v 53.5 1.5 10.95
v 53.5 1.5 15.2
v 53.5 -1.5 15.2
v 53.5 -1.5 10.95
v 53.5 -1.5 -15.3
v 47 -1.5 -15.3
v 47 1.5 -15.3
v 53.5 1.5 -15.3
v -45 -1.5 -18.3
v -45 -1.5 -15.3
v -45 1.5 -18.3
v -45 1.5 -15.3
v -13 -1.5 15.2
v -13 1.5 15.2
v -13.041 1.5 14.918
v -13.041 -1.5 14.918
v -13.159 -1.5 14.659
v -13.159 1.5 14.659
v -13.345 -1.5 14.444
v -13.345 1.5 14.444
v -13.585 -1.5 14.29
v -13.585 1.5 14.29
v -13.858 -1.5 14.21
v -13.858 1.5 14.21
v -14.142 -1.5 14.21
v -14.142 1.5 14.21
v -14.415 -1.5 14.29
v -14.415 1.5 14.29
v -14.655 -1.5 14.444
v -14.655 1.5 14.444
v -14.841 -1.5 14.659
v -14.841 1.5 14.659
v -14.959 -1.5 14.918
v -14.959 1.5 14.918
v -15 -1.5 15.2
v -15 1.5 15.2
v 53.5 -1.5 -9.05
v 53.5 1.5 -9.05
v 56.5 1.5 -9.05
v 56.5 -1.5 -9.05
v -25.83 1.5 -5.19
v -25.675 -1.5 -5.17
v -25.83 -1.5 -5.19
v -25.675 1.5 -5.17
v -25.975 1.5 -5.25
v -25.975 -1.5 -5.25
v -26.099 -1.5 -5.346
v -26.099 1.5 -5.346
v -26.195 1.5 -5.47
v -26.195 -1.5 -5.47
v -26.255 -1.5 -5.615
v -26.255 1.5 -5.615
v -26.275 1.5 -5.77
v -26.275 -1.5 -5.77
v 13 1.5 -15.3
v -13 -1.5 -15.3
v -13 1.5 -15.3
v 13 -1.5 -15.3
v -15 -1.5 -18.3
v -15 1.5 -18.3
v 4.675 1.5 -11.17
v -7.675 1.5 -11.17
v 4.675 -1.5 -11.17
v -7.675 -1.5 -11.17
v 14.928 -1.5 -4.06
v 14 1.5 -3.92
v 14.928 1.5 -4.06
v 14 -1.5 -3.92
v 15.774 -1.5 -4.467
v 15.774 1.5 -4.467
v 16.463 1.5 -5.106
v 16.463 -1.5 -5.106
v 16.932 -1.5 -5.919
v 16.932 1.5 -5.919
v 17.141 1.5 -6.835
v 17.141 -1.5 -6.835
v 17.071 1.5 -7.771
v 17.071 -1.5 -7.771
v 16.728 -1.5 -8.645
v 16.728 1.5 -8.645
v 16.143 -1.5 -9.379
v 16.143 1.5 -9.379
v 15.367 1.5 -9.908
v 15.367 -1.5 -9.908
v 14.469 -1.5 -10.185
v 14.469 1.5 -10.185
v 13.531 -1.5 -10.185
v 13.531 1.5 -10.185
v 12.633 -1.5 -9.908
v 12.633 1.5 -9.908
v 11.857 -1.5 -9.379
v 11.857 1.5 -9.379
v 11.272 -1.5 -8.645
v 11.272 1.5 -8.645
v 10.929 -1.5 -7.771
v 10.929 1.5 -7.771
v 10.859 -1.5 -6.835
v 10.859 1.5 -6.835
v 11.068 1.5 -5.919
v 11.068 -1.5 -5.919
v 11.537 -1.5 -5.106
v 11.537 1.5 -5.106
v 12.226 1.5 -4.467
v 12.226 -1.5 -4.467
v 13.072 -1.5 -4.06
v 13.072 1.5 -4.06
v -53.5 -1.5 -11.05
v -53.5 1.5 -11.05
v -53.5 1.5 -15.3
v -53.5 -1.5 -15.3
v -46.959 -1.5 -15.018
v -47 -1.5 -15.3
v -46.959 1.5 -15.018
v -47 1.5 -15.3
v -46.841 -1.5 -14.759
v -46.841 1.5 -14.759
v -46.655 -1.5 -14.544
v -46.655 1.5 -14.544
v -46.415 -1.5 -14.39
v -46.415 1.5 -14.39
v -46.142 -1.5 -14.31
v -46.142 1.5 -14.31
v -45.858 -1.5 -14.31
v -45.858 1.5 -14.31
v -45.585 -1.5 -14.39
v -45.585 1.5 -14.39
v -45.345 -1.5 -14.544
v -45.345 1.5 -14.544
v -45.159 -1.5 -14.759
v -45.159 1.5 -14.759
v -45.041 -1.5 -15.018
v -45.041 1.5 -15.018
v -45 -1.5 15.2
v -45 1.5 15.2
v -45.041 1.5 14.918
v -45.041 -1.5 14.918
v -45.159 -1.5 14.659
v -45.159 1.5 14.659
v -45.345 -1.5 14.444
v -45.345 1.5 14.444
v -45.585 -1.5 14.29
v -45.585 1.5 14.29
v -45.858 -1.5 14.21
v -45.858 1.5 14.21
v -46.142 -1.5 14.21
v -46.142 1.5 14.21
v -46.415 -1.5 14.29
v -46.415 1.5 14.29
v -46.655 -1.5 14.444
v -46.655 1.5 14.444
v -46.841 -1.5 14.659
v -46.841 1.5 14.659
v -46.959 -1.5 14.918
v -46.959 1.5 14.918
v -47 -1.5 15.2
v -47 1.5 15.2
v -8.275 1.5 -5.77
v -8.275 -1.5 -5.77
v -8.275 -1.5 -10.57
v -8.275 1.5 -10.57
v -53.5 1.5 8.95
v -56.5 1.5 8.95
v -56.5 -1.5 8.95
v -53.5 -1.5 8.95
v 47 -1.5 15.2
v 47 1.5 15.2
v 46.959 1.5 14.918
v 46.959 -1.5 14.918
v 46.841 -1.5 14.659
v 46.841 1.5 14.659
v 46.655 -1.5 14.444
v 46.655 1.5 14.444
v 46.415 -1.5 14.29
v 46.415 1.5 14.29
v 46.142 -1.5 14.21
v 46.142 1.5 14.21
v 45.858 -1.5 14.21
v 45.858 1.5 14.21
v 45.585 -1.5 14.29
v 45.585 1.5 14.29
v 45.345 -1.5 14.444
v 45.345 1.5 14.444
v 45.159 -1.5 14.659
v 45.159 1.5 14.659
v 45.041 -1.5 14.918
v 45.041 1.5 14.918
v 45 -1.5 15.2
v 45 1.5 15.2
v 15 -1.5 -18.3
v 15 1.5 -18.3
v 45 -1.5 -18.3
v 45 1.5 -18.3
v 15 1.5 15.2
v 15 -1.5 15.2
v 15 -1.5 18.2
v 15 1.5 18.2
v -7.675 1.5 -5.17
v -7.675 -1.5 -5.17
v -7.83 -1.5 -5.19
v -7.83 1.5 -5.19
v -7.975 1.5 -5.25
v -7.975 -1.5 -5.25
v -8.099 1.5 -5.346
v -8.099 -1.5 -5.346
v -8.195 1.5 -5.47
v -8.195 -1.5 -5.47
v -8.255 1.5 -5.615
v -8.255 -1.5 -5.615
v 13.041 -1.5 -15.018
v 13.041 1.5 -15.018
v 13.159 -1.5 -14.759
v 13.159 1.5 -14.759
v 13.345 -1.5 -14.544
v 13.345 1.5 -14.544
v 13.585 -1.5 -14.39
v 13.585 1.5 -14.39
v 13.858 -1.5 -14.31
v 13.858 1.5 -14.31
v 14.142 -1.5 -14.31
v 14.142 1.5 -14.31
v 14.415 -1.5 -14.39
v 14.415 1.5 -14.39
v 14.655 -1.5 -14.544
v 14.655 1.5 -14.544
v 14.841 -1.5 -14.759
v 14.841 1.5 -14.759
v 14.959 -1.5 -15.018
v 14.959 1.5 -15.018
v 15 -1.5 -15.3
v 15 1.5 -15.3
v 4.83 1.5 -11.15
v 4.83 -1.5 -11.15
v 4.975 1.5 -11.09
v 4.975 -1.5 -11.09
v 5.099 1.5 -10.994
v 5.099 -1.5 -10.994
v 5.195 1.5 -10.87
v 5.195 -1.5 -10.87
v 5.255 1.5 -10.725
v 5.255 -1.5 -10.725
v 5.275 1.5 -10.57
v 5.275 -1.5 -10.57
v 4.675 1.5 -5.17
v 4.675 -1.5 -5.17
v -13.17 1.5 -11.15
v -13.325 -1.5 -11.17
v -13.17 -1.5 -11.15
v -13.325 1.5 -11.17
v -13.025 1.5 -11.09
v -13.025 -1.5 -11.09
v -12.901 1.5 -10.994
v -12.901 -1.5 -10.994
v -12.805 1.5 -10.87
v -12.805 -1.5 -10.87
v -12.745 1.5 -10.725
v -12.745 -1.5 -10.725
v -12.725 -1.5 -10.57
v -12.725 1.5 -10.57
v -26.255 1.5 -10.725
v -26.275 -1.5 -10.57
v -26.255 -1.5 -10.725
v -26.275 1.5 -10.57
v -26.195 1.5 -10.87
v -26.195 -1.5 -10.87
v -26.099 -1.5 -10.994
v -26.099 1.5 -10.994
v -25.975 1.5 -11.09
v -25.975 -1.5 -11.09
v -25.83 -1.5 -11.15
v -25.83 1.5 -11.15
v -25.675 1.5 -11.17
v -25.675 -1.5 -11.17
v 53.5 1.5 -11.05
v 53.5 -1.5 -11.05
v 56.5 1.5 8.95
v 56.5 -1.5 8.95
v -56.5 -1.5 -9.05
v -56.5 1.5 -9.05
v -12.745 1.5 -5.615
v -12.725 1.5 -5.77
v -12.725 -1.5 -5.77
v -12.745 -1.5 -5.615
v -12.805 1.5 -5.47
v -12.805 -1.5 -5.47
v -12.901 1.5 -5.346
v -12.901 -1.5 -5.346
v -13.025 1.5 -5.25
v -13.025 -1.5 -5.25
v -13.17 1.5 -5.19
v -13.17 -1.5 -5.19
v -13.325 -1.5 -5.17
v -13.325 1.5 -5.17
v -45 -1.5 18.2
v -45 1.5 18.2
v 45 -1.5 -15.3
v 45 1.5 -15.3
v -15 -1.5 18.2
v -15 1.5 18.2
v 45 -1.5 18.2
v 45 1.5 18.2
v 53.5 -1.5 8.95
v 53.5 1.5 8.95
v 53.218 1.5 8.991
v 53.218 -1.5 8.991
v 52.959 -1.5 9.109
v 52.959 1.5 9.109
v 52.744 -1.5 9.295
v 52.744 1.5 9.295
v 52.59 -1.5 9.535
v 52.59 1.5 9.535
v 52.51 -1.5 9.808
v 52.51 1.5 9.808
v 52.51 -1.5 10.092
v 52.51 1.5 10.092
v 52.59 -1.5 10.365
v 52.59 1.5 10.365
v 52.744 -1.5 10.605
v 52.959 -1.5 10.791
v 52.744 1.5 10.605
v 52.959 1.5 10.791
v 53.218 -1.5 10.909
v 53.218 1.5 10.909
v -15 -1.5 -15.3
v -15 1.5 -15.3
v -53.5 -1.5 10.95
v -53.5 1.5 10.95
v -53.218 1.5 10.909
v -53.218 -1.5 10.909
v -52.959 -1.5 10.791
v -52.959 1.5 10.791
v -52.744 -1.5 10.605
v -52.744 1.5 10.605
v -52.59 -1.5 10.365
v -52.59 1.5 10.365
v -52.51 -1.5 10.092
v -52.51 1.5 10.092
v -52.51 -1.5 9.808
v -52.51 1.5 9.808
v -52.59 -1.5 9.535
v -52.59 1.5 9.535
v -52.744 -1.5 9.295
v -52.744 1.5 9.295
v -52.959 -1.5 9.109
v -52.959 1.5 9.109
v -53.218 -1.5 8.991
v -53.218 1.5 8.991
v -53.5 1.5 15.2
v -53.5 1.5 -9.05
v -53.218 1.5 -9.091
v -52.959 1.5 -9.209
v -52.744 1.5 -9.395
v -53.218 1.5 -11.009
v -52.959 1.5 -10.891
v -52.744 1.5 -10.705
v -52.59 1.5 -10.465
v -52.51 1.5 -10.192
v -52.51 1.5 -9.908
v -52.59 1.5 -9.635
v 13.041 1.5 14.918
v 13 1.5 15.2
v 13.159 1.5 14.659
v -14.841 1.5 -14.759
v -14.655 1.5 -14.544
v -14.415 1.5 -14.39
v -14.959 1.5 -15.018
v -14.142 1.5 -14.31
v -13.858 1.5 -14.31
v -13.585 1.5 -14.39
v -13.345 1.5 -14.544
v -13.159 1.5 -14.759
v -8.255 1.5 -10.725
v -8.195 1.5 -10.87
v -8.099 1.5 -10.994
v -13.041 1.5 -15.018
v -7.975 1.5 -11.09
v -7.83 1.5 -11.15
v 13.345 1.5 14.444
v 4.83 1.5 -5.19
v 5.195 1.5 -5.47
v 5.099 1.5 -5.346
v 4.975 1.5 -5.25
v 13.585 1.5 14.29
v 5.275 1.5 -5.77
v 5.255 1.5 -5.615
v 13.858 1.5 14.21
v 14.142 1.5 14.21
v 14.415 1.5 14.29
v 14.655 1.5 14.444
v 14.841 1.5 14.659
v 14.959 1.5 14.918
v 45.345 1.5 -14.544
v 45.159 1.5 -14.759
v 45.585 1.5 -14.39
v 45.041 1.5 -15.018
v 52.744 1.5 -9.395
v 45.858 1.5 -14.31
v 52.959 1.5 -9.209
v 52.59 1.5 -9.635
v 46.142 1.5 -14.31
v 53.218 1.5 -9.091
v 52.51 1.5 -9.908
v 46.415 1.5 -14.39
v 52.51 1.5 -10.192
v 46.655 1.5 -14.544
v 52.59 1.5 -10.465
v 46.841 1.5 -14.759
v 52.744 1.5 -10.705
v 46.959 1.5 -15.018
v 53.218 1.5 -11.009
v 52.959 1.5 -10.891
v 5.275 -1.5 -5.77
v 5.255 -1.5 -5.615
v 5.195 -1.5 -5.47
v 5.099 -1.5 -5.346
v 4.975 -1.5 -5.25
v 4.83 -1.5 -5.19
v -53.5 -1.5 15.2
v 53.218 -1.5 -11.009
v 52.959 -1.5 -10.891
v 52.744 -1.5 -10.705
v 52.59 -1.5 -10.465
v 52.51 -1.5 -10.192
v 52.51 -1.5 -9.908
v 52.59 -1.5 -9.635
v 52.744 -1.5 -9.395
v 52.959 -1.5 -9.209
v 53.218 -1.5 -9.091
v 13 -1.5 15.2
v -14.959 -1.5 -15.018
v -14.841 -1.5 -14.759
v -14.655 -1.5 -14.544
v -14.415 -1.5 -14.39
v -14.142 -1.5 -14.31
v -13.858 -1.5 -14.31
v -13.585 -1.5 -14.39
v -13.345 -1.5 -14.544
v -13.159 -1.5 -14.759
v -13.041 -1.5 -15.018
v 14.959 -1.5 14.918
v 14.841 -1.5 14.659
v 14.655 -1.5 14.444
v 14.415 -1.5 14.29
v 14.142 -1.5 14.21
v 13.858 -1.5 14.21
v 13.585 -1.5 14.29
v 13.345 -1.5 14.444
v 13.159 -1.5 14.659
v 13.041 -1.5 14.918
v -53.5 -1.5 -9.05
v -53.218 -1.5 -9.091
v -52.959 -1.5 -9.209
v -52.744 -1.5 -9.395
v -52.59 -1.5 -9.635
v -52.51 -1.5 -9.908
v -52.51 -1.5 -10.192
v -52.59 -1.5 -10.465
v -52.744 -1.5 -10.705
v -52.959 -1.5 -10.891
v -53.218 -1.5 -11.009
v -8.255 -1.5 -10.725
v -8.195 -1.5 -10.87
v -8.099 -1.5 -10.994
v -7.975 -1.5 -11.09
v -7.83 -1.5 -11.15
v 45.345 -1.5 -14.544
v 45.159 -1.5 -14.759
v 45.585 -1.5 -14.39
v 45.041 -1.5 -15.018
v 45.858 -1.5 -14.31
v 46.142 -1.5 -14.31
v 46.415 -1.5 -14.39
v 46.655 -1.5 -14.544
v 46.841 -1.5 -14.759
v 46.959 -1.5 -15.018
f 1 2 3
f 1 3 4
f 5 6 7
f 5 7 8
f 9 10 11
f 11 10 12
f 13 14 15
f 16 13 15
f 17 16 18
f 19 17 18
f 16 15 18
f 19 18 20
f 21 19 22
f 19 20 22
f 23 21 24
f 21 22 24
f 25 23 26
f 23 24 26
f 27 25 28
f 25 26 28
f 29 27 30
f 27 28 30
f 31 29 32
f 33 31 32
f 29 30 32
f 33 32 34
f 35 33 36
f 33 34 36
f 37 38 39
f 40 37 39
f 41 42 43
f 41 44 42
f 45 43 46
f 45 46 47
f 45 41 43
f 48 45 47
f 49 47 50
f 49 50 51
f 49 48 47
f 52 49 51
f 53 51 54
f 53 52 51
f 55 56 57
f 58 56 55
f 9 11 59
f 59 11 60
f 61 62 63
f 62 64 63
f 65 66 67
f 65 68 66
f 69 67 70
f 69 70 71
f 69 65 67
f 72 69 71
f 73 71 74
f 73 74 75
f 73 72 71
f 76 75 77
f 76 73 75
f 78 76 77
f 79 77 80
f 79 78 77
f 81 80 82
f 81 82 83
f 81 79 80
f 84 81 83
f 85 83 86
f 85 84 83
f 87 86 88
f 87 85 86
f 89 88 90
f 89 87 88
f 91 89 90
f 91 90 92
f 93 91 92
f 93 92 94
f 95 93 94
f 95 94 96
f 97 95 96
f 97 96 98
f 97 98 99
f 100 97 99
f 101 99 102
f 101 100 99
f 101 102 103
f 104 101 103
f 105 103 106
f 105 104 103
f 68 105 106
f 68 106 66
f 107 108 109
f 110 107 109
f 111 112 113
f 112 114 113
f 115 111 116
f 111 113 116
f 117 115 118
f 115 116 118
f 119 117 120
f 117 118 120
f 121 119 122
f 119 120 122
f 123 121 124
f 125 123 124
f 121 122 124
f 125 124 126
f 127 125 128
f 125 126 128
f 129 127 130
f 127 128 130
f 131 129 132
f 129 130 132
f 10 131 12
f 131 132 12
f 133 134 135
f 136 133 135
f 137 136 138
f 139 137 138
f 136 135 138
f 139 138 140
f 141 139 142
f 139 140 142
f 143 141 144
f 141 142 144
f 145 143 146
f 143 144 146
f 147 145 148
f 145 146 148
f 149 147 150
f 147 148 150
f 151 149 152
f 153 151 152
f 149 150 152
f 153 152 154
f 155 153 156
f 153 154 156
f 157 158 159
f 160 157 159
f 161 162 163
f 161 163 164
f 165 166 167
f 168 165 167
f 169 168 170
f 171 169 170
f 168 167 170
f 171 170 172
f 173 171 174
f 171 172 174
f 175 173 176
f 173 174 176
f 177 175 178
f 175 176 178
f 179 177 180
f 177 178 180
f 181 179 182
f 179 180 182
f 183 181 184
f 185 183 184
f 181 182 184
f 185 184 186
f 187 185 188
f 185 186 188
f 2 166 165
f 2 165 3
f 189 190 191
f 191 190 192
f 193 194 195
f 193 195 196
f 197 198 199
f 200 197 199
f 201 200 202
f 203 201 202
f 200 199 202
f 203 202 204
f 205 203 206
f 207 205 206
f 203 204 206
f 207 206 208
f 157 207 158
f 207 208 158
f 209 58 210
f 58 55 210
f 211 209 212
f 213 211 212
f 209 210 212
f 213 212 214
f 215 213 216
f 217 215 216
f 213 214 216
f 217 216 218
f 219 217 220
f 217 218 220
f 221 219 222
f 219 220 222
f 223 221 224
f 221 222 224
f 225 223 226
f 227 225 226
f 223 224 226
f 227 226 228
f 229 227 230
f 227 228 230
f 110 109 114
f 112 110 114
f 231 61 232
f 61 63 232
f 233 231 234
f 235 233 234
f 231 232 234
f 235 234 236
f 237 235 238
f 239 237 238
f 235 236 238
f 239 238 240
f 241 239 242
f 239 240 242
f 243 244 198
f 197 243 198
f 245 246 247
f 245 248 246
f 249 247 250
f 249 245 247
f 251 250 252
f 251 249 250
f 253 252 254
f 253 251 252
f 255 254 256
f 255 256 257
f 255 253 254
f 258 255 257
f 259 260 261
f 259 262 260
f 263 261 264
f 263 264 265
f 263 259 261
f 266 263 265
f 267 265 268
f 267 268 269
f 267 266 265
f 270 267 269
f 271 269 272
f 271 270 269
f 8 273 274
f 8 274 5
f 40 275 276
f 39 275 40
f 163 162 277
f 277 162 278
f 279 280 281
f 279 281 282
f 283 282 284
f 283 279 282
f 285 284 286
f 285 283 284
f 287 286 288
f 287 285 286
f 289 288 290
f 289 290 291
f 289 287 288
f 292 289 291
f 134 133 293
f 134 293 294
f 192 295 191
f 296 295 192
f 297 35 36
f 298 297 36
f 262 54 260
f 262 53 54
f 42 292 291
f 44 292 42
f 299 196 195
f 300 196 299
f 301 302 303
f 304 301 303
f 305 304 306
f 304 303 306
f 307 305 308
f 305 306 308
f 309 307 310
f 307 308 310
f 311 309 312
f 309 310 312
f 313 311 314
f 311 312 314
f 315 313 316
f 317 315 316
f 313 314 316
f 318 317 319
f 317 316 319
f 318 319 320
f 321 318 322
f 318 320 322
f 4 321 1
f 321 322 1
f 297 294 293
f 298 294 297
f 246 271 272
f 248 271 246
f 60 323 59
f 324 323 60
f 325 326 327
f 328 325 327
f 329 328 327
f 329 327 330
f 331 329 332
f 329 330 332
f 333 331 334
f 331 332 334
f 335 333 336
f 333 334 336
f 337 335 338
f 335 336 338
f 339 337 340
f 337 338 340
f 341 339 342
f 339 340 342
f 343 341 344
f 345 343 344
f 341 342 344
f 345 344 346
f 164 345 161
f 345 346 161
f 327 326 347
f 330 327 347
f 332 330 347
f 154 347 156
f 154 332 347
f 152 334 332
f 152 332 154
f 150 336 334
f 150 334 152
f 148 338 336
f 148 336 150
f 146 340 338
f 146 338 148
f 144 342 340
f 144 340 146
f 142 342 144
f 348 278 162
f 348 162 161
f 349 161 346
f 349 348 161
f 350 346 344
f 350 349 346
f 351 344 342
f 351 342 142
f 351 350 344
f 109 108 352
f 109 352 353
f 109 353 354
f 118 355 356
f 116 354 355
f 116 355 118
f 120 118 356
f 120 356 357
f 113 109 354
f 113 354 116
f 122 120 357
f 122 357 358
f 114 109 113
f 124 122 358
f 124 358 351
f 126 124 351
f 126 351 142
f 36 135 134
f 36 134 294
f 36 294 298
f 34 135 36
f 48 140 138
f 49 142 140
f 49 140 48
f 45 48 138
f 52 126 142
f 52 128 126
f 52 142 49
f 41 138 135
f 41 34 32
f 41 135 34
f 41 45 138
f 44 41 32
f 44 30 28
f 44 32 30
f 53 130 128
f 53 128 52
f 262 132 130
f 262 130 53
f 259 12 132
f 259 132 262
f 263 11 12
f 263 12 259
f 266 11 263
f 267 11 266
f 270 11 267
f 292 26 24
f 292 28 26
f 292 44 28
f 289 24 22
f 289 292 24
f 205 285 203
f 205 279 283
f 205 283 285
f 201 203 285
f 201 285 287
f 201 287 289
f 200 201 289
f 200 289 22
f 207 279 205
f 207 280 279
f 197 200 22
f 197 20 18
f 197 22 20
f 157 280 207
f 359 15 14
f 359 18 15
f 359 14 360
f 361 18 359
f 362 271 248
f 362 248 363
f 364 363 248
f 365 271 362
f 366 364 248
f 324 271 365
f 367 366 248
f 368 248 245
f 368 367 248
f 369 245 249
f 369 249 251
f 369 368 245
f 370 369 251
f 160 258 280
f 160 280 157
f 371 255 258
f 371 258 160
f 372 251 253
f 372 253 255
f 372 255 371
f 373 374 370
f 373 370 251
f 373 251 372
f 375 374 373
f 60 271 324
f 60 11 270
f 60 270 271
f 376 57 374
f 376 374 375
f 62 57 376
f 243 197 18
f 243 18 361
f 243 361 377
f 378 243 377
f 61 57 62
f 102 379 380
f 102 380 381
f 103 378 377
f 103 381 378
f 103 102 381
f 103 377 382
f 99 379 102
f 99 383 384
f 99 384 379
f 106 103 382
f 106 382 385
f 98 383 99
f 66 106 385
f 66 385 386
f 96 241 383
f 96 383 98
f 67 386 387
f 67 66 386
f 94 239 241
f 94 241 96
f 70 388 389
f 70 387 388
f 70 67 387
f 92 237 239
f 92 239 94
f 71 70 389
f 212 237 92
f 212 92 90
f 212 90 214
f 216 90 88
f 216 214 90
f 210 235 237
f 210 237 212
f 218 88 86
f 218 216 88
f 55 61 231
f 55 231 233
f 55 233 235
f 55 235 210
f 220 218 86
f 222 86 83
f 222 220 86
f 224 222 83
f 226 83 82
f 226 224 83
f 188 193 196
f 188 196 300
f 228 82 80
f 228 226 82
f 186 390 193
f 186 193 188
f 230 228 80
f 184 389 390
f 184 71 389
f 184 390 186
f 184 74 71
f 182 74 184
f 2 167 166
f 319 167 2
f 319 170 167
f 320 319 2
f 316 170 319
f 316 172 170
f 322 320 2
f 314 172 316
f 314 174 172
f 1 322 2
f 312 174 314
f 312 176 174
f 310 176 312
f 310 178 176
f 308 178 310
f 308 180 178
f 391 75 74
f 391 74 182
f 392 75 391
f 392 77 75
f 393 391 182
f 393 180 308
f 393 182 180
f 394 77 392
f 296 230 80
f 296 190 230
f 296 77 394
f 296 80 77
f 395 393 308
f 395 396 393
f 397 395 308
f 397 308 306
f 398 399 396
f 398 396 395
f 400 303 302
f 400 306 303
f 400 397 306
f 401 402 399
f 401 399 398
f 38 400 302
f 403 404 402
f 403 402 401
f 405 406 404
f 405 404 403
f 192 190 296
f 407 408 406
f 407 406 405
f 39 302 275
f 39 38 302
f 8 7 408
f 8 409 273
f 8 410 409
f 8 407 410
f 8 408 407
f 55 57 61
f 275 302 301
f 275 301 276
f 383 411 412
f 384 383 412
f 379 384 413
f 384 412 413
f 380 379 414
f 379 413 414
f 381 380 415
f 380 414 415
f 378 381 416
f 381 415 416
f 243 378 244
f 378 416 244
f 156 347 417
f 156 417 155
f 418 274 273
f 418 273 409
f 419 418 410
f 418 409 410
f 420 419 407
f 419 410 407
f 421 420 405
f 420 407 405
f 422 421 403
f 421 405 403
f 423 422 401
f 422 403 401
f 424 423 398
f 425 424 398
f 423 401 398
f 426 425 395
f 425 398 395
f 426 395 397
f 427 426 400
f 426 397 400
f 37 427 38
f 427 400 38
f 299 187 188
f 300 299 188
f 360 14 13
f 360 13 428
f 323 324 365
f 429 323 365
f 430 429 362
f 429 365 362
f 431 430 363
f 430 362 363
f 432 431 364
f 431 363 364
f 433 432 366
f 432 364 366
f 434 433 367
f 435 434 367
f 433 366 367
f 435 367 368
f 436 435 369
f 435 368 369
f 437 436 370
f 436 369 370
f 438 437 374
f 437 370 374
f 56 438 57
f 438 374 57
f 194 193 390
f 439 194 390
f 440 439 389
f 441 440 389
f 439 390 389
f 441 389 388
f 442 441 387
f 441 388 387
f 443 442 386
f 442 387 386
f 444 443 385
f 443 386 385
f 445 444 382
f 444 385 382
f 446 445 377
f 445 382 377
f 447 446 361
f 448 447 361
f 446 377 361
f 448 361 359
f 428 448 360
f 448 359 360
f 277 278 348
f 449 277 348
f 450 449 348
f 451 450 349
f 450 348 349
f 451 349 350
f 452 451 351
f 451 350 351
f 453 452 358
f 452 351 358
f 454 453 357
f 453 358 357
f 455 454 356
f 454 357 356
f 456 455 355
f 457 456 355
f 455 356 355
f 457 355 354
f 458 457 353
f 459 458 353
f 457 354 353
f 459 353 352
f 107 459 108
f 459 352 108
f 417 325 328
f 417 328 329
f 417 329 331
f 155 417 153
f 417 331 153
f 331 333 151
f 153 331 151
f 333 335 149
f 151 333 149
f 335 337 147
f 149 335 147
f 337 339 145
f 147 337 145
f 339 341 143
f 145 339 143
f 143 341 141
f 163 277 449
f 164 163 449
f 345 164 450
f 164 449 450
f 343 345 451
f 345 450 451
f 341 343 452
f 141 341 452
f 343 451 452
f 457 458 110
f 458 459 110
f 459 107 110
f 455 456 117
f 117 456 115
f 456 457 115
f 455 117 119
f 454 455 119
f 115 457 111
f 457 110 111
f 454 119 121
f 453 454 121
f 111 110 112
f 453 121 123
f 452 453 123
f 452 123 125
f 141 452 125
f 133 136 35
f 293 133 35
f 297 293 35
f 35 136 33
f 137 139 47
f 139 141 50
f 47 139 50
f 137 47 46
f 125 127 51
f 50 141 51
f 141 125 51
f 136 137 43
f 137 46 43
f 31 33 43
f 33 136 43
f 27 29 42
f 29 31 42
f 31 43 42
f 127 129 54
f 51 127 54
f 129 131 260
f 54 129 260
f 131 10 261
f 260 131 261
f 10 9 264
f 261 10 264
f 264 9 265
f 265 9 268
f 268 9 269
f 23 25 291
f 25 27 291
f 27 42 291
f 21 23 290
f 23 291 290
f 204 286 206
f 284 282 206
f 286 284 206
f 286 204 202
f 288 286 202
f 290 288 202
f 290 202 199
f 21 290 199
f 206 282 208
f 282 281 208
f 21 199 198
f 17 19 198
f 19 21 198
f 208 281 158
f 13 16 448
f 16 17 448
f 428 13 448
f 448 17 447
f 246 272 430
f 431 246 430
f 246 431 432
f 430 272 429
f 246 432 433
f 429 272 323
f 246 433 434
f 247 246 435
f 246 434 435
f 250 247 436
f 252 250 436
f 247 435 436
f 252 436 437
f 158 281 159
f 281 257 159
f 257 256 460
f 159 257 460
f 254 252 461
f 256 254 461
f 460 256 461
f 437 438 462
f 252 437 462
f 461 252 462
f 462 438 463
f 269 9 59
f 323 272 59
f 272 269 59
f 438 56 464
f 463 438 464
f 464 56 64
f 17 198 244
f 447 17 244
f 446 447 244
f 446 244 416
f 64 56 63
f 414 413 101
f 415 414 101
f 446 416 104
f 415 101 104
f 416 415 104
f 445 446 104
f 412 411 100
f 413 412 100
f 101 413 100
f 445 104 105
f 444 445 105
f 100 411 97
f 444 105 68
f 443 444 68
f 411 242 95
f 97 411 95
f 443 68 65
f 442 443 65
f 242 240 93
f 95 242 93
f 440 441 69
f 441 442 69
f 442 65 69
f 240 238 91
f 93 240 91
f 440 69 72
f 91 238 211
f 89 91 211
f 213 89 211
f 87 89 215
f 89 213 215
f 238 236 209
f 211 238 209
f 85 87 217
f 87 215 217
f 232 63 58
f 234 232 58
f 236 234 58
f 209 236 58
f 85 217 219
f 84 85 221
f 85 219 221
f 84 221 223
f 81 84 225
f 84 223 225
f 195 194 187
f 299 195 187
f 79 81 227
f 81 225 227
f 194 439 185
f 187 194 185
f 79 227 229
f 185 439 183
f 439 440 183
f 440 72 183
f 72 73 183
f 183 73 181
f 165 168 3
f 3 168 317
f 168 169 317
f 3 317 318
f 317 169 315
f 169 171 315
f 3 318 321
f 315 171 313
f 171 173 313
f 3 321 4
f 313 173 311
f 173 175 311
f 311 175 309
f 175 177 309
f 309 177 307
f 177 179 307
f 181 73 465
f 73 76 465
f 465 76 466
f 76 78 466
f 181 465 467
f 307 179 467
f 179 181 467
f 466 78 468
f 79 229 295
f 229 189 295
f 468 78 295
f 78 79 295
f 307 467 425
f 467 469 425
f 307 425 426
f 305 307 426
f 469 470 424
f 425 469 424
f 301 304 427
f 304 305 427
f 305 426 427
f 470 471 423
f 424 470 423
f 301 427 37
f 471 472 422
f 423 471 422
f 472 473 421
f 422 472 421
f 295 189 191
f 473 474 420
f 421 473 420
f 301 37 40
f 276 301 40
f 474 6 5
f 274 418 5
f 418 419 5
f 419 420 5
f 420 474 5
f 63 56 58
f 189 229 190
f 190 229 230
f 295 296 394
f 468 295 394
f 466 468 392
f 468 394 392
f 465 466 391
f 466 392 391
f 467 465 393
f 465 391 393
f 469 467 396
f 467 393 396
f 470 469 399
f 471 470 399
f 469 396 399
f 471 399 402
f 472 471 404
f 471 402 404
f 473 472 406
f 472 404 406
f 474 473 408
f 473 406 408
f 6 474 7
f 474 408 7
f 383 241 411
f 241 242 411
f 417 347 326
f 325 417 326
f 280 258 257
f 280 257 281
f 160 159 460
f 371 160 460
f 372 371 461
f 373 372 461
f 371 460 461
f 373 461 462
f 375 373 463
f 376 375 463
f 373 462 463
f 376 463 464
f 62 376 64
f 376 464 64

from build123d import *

# Parameters (mm, degrees)
EXTRUDE_1_DEPTH     = 1.5
SKETCH_3_R          = 3.15
CUT_EXTRUDE_2_DEPTH = 1.5
SKETCH_5_W          = 99
SKETCH_5_H          = 11.3
CUT_EXTRUDE_4_DEPTH = 10
SKETCH_6_W          = 30
SKETCH_6_H          = 3
EXTRUDE_2_DEPTH     = 3
SKETCH_8_W          = 3
SKETCH_8_H          = 18
SKETCH_8_W_2        = 4
SKETCH_8_H_2        = 30.5
EXTRUDE_3_DEPTH     = 3
SKETCH_7_R          = 1
CUT_EXTRUDE_5_DEPTH = 3


with BuildPart() as part:
    # 草图2 → 凸台-拉伸1 (new, symmetric)
    with BuildSketch(Plane(origin=(0, 0, 0), x_dir=(1, 0, 0), z_dir=(0, 1, 0))):
        Polygon((-49.5, 26.6), (-49.5, -15.2), (49.5, -15.2), (49.5, 26.599983447), align=None)
    extrude(amount=EXTRUDE_1_DEPTH, both=True)

    # 草图3 → 切除-拉伸2 (cut, symmetric)
    with BuildSketch(Plane(origin=(0, 0, 0), x_dir=(1, 0, 0), z_dir=(0, 1, 0))):
        with Locations(Location((13.999999636, 7.069989383, 0), (0, 0, 270))):
            Circle(SKETCH_3_R)
        with BuildLine():
            Line((5.275, 10.57), (5.275, 5.77))
            ThreePointArc((5.275, 5.77), (5.099264069, 5.345735931), (4.675, 5.17))
            Line((4.675, 5.17), (-7.675, 5.17))
            ThreePointArc((-7.675, 5.17), (-8.099264069, 5.345735931), (-8.275, 5.77))
            Line((-8.275, 5.77), (-8.275, 10.57))
            ThreePointArc((-8.275, 10.57), (-8.099264069, 10.994264069), (-7.675, 11.17))
            Line((-7.675, 11.17), (4.675, 11.17))
            ThreePointArc((4.675, 11.17), (5.099264069, 10.994264069), (5.275, 10.57))
        make_face()
        with BuildLine():
            Line((-13.325, 5.17), (-25.675, 5.17))
            ThreePointArc((-25.675, 5.17), (-26.099264069, 5.345735931), (-26.275, 5.77))
            Line((-26.275, 5.77), (-26.275, 10.57))
            ThreePointArc((-26.275, 10.57), (-26.099264069, 10.994264069), (-25.675, 11.17))
            Line((-25.675, 11.17), (-13.325, 11.17))
            ThreePointArc((-13.325, 11.17), (-12.900735931, 10.994264069), (-12.725, 10.57))
            Line((-12.725, 10.57), (-12.725, 5.77))
            ThreePointArc((-12.725, 5.77), (-12.900735931, 5.345735931), (-13.325, 5.17))
        make_face()
    extrude(amount=CUT_EXTRUDE_2_DEPTH, both=True, mode=Mode.SUBTRACT)

    # 草图5 → 切除-拉伸4 (cut)
    with BuildSketch(Plane.XZ.offset(1.5)):
        with Locations((0, -20.95)):
            Rectangle(SKETCH_5_W, SKETCH_5_H)
    extrude(amount=-CUT_EXTRUDE_4_DEPTH, mode=Mode.SUBTRACT)

    # 草图6 → 凸台-拉伸2 (add)
    with BuildSketch(Plane.XY.offset(15.2)):
        with Locations((30, 0)):
            Rectangle(SKETCH_6_W, SKETCH_6_H)
        with Locations((-30, 0)):
            Rectangle(SKETCH_6_W, SKETCH_6_H)
    extrude_2 = extrude(amount=EXTRUDE_2_DEPTH)

    # 镜向1: 凸台-拉伸2 across plane
    add(extrude_2.mirror(Plane.XY.offset(-0.05)))

    # 草图8 → 凸台-拉伸3 (add)
    with BuildSketch(Plane(origin=(0, 1.5, 0), x_dir=(1, 0, 0), z_dir=(0, 1, 0))):
        with Locations((-55, 0.05)):
            Rectangle(SKETCH_8_W, SKETCH_8_H)
        with Locations((-51.5, 0.05)):
            Rectangle(SKETCH_8_W_2, SKETCH_8_H_2)
        Polygon((53.5, -15.2), (53.5, -8.95), (53.5, 9.05), (53.5, 15.3), (49.5, 15.3), (49.5, -15.2), align=None)
        with Locations((55, 0.05)):
            Rectangle(SKETCH_8_W, SKETCH_8_H)
    extrude(amount=-EXTRUDE_3_DEPTH)

    # 草图7 → 切除-拉伸5 (cut)
    with BuildSketch(Plane(origin=(0, 1.5, 0), x_dir=(1, 0, 0), z_dir=(0, 1, 0))):
        with Locations((-14, 15.3)):
            Circle(SKETCH_7_R)
        with Locations((14, 15.3)):
            Circle(SKETCH_7_R)
        with Locations((46, 15.3)):
            Circle(SKETCH_7_R)
        with Locations((14, -15.2)):
            Circle(SKETCH_7_R)
        with Locations((-14, -15.2)):
            Circle(SKETCH_7_R)
        with Locations((-46, -15.2)):
            Circle(SKETCH_7_R)
        with Locations((-46, 15.3)):
            Circle(SKETCH_7_R)
        with Locations((46, -15.2)):
            Circle(SKETCH_7_R)
        with Locations((-53.5, 10.05)):
            Circle(SKETCH_7_R)
        with Locations((-53.5, -9.95)):
            Circle(SKETCH_7_R)
        with Locations((53.5, 10.05)):
            Circle(SKETCH_7_R)
        with Locations((53.5, -9.95)):
            Circle(SKETCH_7_R)
    extrude(amount=-CUT_EXTRUDE_5_DEPTH, mode=Mode.SUBTRACT)


solid = part.part
